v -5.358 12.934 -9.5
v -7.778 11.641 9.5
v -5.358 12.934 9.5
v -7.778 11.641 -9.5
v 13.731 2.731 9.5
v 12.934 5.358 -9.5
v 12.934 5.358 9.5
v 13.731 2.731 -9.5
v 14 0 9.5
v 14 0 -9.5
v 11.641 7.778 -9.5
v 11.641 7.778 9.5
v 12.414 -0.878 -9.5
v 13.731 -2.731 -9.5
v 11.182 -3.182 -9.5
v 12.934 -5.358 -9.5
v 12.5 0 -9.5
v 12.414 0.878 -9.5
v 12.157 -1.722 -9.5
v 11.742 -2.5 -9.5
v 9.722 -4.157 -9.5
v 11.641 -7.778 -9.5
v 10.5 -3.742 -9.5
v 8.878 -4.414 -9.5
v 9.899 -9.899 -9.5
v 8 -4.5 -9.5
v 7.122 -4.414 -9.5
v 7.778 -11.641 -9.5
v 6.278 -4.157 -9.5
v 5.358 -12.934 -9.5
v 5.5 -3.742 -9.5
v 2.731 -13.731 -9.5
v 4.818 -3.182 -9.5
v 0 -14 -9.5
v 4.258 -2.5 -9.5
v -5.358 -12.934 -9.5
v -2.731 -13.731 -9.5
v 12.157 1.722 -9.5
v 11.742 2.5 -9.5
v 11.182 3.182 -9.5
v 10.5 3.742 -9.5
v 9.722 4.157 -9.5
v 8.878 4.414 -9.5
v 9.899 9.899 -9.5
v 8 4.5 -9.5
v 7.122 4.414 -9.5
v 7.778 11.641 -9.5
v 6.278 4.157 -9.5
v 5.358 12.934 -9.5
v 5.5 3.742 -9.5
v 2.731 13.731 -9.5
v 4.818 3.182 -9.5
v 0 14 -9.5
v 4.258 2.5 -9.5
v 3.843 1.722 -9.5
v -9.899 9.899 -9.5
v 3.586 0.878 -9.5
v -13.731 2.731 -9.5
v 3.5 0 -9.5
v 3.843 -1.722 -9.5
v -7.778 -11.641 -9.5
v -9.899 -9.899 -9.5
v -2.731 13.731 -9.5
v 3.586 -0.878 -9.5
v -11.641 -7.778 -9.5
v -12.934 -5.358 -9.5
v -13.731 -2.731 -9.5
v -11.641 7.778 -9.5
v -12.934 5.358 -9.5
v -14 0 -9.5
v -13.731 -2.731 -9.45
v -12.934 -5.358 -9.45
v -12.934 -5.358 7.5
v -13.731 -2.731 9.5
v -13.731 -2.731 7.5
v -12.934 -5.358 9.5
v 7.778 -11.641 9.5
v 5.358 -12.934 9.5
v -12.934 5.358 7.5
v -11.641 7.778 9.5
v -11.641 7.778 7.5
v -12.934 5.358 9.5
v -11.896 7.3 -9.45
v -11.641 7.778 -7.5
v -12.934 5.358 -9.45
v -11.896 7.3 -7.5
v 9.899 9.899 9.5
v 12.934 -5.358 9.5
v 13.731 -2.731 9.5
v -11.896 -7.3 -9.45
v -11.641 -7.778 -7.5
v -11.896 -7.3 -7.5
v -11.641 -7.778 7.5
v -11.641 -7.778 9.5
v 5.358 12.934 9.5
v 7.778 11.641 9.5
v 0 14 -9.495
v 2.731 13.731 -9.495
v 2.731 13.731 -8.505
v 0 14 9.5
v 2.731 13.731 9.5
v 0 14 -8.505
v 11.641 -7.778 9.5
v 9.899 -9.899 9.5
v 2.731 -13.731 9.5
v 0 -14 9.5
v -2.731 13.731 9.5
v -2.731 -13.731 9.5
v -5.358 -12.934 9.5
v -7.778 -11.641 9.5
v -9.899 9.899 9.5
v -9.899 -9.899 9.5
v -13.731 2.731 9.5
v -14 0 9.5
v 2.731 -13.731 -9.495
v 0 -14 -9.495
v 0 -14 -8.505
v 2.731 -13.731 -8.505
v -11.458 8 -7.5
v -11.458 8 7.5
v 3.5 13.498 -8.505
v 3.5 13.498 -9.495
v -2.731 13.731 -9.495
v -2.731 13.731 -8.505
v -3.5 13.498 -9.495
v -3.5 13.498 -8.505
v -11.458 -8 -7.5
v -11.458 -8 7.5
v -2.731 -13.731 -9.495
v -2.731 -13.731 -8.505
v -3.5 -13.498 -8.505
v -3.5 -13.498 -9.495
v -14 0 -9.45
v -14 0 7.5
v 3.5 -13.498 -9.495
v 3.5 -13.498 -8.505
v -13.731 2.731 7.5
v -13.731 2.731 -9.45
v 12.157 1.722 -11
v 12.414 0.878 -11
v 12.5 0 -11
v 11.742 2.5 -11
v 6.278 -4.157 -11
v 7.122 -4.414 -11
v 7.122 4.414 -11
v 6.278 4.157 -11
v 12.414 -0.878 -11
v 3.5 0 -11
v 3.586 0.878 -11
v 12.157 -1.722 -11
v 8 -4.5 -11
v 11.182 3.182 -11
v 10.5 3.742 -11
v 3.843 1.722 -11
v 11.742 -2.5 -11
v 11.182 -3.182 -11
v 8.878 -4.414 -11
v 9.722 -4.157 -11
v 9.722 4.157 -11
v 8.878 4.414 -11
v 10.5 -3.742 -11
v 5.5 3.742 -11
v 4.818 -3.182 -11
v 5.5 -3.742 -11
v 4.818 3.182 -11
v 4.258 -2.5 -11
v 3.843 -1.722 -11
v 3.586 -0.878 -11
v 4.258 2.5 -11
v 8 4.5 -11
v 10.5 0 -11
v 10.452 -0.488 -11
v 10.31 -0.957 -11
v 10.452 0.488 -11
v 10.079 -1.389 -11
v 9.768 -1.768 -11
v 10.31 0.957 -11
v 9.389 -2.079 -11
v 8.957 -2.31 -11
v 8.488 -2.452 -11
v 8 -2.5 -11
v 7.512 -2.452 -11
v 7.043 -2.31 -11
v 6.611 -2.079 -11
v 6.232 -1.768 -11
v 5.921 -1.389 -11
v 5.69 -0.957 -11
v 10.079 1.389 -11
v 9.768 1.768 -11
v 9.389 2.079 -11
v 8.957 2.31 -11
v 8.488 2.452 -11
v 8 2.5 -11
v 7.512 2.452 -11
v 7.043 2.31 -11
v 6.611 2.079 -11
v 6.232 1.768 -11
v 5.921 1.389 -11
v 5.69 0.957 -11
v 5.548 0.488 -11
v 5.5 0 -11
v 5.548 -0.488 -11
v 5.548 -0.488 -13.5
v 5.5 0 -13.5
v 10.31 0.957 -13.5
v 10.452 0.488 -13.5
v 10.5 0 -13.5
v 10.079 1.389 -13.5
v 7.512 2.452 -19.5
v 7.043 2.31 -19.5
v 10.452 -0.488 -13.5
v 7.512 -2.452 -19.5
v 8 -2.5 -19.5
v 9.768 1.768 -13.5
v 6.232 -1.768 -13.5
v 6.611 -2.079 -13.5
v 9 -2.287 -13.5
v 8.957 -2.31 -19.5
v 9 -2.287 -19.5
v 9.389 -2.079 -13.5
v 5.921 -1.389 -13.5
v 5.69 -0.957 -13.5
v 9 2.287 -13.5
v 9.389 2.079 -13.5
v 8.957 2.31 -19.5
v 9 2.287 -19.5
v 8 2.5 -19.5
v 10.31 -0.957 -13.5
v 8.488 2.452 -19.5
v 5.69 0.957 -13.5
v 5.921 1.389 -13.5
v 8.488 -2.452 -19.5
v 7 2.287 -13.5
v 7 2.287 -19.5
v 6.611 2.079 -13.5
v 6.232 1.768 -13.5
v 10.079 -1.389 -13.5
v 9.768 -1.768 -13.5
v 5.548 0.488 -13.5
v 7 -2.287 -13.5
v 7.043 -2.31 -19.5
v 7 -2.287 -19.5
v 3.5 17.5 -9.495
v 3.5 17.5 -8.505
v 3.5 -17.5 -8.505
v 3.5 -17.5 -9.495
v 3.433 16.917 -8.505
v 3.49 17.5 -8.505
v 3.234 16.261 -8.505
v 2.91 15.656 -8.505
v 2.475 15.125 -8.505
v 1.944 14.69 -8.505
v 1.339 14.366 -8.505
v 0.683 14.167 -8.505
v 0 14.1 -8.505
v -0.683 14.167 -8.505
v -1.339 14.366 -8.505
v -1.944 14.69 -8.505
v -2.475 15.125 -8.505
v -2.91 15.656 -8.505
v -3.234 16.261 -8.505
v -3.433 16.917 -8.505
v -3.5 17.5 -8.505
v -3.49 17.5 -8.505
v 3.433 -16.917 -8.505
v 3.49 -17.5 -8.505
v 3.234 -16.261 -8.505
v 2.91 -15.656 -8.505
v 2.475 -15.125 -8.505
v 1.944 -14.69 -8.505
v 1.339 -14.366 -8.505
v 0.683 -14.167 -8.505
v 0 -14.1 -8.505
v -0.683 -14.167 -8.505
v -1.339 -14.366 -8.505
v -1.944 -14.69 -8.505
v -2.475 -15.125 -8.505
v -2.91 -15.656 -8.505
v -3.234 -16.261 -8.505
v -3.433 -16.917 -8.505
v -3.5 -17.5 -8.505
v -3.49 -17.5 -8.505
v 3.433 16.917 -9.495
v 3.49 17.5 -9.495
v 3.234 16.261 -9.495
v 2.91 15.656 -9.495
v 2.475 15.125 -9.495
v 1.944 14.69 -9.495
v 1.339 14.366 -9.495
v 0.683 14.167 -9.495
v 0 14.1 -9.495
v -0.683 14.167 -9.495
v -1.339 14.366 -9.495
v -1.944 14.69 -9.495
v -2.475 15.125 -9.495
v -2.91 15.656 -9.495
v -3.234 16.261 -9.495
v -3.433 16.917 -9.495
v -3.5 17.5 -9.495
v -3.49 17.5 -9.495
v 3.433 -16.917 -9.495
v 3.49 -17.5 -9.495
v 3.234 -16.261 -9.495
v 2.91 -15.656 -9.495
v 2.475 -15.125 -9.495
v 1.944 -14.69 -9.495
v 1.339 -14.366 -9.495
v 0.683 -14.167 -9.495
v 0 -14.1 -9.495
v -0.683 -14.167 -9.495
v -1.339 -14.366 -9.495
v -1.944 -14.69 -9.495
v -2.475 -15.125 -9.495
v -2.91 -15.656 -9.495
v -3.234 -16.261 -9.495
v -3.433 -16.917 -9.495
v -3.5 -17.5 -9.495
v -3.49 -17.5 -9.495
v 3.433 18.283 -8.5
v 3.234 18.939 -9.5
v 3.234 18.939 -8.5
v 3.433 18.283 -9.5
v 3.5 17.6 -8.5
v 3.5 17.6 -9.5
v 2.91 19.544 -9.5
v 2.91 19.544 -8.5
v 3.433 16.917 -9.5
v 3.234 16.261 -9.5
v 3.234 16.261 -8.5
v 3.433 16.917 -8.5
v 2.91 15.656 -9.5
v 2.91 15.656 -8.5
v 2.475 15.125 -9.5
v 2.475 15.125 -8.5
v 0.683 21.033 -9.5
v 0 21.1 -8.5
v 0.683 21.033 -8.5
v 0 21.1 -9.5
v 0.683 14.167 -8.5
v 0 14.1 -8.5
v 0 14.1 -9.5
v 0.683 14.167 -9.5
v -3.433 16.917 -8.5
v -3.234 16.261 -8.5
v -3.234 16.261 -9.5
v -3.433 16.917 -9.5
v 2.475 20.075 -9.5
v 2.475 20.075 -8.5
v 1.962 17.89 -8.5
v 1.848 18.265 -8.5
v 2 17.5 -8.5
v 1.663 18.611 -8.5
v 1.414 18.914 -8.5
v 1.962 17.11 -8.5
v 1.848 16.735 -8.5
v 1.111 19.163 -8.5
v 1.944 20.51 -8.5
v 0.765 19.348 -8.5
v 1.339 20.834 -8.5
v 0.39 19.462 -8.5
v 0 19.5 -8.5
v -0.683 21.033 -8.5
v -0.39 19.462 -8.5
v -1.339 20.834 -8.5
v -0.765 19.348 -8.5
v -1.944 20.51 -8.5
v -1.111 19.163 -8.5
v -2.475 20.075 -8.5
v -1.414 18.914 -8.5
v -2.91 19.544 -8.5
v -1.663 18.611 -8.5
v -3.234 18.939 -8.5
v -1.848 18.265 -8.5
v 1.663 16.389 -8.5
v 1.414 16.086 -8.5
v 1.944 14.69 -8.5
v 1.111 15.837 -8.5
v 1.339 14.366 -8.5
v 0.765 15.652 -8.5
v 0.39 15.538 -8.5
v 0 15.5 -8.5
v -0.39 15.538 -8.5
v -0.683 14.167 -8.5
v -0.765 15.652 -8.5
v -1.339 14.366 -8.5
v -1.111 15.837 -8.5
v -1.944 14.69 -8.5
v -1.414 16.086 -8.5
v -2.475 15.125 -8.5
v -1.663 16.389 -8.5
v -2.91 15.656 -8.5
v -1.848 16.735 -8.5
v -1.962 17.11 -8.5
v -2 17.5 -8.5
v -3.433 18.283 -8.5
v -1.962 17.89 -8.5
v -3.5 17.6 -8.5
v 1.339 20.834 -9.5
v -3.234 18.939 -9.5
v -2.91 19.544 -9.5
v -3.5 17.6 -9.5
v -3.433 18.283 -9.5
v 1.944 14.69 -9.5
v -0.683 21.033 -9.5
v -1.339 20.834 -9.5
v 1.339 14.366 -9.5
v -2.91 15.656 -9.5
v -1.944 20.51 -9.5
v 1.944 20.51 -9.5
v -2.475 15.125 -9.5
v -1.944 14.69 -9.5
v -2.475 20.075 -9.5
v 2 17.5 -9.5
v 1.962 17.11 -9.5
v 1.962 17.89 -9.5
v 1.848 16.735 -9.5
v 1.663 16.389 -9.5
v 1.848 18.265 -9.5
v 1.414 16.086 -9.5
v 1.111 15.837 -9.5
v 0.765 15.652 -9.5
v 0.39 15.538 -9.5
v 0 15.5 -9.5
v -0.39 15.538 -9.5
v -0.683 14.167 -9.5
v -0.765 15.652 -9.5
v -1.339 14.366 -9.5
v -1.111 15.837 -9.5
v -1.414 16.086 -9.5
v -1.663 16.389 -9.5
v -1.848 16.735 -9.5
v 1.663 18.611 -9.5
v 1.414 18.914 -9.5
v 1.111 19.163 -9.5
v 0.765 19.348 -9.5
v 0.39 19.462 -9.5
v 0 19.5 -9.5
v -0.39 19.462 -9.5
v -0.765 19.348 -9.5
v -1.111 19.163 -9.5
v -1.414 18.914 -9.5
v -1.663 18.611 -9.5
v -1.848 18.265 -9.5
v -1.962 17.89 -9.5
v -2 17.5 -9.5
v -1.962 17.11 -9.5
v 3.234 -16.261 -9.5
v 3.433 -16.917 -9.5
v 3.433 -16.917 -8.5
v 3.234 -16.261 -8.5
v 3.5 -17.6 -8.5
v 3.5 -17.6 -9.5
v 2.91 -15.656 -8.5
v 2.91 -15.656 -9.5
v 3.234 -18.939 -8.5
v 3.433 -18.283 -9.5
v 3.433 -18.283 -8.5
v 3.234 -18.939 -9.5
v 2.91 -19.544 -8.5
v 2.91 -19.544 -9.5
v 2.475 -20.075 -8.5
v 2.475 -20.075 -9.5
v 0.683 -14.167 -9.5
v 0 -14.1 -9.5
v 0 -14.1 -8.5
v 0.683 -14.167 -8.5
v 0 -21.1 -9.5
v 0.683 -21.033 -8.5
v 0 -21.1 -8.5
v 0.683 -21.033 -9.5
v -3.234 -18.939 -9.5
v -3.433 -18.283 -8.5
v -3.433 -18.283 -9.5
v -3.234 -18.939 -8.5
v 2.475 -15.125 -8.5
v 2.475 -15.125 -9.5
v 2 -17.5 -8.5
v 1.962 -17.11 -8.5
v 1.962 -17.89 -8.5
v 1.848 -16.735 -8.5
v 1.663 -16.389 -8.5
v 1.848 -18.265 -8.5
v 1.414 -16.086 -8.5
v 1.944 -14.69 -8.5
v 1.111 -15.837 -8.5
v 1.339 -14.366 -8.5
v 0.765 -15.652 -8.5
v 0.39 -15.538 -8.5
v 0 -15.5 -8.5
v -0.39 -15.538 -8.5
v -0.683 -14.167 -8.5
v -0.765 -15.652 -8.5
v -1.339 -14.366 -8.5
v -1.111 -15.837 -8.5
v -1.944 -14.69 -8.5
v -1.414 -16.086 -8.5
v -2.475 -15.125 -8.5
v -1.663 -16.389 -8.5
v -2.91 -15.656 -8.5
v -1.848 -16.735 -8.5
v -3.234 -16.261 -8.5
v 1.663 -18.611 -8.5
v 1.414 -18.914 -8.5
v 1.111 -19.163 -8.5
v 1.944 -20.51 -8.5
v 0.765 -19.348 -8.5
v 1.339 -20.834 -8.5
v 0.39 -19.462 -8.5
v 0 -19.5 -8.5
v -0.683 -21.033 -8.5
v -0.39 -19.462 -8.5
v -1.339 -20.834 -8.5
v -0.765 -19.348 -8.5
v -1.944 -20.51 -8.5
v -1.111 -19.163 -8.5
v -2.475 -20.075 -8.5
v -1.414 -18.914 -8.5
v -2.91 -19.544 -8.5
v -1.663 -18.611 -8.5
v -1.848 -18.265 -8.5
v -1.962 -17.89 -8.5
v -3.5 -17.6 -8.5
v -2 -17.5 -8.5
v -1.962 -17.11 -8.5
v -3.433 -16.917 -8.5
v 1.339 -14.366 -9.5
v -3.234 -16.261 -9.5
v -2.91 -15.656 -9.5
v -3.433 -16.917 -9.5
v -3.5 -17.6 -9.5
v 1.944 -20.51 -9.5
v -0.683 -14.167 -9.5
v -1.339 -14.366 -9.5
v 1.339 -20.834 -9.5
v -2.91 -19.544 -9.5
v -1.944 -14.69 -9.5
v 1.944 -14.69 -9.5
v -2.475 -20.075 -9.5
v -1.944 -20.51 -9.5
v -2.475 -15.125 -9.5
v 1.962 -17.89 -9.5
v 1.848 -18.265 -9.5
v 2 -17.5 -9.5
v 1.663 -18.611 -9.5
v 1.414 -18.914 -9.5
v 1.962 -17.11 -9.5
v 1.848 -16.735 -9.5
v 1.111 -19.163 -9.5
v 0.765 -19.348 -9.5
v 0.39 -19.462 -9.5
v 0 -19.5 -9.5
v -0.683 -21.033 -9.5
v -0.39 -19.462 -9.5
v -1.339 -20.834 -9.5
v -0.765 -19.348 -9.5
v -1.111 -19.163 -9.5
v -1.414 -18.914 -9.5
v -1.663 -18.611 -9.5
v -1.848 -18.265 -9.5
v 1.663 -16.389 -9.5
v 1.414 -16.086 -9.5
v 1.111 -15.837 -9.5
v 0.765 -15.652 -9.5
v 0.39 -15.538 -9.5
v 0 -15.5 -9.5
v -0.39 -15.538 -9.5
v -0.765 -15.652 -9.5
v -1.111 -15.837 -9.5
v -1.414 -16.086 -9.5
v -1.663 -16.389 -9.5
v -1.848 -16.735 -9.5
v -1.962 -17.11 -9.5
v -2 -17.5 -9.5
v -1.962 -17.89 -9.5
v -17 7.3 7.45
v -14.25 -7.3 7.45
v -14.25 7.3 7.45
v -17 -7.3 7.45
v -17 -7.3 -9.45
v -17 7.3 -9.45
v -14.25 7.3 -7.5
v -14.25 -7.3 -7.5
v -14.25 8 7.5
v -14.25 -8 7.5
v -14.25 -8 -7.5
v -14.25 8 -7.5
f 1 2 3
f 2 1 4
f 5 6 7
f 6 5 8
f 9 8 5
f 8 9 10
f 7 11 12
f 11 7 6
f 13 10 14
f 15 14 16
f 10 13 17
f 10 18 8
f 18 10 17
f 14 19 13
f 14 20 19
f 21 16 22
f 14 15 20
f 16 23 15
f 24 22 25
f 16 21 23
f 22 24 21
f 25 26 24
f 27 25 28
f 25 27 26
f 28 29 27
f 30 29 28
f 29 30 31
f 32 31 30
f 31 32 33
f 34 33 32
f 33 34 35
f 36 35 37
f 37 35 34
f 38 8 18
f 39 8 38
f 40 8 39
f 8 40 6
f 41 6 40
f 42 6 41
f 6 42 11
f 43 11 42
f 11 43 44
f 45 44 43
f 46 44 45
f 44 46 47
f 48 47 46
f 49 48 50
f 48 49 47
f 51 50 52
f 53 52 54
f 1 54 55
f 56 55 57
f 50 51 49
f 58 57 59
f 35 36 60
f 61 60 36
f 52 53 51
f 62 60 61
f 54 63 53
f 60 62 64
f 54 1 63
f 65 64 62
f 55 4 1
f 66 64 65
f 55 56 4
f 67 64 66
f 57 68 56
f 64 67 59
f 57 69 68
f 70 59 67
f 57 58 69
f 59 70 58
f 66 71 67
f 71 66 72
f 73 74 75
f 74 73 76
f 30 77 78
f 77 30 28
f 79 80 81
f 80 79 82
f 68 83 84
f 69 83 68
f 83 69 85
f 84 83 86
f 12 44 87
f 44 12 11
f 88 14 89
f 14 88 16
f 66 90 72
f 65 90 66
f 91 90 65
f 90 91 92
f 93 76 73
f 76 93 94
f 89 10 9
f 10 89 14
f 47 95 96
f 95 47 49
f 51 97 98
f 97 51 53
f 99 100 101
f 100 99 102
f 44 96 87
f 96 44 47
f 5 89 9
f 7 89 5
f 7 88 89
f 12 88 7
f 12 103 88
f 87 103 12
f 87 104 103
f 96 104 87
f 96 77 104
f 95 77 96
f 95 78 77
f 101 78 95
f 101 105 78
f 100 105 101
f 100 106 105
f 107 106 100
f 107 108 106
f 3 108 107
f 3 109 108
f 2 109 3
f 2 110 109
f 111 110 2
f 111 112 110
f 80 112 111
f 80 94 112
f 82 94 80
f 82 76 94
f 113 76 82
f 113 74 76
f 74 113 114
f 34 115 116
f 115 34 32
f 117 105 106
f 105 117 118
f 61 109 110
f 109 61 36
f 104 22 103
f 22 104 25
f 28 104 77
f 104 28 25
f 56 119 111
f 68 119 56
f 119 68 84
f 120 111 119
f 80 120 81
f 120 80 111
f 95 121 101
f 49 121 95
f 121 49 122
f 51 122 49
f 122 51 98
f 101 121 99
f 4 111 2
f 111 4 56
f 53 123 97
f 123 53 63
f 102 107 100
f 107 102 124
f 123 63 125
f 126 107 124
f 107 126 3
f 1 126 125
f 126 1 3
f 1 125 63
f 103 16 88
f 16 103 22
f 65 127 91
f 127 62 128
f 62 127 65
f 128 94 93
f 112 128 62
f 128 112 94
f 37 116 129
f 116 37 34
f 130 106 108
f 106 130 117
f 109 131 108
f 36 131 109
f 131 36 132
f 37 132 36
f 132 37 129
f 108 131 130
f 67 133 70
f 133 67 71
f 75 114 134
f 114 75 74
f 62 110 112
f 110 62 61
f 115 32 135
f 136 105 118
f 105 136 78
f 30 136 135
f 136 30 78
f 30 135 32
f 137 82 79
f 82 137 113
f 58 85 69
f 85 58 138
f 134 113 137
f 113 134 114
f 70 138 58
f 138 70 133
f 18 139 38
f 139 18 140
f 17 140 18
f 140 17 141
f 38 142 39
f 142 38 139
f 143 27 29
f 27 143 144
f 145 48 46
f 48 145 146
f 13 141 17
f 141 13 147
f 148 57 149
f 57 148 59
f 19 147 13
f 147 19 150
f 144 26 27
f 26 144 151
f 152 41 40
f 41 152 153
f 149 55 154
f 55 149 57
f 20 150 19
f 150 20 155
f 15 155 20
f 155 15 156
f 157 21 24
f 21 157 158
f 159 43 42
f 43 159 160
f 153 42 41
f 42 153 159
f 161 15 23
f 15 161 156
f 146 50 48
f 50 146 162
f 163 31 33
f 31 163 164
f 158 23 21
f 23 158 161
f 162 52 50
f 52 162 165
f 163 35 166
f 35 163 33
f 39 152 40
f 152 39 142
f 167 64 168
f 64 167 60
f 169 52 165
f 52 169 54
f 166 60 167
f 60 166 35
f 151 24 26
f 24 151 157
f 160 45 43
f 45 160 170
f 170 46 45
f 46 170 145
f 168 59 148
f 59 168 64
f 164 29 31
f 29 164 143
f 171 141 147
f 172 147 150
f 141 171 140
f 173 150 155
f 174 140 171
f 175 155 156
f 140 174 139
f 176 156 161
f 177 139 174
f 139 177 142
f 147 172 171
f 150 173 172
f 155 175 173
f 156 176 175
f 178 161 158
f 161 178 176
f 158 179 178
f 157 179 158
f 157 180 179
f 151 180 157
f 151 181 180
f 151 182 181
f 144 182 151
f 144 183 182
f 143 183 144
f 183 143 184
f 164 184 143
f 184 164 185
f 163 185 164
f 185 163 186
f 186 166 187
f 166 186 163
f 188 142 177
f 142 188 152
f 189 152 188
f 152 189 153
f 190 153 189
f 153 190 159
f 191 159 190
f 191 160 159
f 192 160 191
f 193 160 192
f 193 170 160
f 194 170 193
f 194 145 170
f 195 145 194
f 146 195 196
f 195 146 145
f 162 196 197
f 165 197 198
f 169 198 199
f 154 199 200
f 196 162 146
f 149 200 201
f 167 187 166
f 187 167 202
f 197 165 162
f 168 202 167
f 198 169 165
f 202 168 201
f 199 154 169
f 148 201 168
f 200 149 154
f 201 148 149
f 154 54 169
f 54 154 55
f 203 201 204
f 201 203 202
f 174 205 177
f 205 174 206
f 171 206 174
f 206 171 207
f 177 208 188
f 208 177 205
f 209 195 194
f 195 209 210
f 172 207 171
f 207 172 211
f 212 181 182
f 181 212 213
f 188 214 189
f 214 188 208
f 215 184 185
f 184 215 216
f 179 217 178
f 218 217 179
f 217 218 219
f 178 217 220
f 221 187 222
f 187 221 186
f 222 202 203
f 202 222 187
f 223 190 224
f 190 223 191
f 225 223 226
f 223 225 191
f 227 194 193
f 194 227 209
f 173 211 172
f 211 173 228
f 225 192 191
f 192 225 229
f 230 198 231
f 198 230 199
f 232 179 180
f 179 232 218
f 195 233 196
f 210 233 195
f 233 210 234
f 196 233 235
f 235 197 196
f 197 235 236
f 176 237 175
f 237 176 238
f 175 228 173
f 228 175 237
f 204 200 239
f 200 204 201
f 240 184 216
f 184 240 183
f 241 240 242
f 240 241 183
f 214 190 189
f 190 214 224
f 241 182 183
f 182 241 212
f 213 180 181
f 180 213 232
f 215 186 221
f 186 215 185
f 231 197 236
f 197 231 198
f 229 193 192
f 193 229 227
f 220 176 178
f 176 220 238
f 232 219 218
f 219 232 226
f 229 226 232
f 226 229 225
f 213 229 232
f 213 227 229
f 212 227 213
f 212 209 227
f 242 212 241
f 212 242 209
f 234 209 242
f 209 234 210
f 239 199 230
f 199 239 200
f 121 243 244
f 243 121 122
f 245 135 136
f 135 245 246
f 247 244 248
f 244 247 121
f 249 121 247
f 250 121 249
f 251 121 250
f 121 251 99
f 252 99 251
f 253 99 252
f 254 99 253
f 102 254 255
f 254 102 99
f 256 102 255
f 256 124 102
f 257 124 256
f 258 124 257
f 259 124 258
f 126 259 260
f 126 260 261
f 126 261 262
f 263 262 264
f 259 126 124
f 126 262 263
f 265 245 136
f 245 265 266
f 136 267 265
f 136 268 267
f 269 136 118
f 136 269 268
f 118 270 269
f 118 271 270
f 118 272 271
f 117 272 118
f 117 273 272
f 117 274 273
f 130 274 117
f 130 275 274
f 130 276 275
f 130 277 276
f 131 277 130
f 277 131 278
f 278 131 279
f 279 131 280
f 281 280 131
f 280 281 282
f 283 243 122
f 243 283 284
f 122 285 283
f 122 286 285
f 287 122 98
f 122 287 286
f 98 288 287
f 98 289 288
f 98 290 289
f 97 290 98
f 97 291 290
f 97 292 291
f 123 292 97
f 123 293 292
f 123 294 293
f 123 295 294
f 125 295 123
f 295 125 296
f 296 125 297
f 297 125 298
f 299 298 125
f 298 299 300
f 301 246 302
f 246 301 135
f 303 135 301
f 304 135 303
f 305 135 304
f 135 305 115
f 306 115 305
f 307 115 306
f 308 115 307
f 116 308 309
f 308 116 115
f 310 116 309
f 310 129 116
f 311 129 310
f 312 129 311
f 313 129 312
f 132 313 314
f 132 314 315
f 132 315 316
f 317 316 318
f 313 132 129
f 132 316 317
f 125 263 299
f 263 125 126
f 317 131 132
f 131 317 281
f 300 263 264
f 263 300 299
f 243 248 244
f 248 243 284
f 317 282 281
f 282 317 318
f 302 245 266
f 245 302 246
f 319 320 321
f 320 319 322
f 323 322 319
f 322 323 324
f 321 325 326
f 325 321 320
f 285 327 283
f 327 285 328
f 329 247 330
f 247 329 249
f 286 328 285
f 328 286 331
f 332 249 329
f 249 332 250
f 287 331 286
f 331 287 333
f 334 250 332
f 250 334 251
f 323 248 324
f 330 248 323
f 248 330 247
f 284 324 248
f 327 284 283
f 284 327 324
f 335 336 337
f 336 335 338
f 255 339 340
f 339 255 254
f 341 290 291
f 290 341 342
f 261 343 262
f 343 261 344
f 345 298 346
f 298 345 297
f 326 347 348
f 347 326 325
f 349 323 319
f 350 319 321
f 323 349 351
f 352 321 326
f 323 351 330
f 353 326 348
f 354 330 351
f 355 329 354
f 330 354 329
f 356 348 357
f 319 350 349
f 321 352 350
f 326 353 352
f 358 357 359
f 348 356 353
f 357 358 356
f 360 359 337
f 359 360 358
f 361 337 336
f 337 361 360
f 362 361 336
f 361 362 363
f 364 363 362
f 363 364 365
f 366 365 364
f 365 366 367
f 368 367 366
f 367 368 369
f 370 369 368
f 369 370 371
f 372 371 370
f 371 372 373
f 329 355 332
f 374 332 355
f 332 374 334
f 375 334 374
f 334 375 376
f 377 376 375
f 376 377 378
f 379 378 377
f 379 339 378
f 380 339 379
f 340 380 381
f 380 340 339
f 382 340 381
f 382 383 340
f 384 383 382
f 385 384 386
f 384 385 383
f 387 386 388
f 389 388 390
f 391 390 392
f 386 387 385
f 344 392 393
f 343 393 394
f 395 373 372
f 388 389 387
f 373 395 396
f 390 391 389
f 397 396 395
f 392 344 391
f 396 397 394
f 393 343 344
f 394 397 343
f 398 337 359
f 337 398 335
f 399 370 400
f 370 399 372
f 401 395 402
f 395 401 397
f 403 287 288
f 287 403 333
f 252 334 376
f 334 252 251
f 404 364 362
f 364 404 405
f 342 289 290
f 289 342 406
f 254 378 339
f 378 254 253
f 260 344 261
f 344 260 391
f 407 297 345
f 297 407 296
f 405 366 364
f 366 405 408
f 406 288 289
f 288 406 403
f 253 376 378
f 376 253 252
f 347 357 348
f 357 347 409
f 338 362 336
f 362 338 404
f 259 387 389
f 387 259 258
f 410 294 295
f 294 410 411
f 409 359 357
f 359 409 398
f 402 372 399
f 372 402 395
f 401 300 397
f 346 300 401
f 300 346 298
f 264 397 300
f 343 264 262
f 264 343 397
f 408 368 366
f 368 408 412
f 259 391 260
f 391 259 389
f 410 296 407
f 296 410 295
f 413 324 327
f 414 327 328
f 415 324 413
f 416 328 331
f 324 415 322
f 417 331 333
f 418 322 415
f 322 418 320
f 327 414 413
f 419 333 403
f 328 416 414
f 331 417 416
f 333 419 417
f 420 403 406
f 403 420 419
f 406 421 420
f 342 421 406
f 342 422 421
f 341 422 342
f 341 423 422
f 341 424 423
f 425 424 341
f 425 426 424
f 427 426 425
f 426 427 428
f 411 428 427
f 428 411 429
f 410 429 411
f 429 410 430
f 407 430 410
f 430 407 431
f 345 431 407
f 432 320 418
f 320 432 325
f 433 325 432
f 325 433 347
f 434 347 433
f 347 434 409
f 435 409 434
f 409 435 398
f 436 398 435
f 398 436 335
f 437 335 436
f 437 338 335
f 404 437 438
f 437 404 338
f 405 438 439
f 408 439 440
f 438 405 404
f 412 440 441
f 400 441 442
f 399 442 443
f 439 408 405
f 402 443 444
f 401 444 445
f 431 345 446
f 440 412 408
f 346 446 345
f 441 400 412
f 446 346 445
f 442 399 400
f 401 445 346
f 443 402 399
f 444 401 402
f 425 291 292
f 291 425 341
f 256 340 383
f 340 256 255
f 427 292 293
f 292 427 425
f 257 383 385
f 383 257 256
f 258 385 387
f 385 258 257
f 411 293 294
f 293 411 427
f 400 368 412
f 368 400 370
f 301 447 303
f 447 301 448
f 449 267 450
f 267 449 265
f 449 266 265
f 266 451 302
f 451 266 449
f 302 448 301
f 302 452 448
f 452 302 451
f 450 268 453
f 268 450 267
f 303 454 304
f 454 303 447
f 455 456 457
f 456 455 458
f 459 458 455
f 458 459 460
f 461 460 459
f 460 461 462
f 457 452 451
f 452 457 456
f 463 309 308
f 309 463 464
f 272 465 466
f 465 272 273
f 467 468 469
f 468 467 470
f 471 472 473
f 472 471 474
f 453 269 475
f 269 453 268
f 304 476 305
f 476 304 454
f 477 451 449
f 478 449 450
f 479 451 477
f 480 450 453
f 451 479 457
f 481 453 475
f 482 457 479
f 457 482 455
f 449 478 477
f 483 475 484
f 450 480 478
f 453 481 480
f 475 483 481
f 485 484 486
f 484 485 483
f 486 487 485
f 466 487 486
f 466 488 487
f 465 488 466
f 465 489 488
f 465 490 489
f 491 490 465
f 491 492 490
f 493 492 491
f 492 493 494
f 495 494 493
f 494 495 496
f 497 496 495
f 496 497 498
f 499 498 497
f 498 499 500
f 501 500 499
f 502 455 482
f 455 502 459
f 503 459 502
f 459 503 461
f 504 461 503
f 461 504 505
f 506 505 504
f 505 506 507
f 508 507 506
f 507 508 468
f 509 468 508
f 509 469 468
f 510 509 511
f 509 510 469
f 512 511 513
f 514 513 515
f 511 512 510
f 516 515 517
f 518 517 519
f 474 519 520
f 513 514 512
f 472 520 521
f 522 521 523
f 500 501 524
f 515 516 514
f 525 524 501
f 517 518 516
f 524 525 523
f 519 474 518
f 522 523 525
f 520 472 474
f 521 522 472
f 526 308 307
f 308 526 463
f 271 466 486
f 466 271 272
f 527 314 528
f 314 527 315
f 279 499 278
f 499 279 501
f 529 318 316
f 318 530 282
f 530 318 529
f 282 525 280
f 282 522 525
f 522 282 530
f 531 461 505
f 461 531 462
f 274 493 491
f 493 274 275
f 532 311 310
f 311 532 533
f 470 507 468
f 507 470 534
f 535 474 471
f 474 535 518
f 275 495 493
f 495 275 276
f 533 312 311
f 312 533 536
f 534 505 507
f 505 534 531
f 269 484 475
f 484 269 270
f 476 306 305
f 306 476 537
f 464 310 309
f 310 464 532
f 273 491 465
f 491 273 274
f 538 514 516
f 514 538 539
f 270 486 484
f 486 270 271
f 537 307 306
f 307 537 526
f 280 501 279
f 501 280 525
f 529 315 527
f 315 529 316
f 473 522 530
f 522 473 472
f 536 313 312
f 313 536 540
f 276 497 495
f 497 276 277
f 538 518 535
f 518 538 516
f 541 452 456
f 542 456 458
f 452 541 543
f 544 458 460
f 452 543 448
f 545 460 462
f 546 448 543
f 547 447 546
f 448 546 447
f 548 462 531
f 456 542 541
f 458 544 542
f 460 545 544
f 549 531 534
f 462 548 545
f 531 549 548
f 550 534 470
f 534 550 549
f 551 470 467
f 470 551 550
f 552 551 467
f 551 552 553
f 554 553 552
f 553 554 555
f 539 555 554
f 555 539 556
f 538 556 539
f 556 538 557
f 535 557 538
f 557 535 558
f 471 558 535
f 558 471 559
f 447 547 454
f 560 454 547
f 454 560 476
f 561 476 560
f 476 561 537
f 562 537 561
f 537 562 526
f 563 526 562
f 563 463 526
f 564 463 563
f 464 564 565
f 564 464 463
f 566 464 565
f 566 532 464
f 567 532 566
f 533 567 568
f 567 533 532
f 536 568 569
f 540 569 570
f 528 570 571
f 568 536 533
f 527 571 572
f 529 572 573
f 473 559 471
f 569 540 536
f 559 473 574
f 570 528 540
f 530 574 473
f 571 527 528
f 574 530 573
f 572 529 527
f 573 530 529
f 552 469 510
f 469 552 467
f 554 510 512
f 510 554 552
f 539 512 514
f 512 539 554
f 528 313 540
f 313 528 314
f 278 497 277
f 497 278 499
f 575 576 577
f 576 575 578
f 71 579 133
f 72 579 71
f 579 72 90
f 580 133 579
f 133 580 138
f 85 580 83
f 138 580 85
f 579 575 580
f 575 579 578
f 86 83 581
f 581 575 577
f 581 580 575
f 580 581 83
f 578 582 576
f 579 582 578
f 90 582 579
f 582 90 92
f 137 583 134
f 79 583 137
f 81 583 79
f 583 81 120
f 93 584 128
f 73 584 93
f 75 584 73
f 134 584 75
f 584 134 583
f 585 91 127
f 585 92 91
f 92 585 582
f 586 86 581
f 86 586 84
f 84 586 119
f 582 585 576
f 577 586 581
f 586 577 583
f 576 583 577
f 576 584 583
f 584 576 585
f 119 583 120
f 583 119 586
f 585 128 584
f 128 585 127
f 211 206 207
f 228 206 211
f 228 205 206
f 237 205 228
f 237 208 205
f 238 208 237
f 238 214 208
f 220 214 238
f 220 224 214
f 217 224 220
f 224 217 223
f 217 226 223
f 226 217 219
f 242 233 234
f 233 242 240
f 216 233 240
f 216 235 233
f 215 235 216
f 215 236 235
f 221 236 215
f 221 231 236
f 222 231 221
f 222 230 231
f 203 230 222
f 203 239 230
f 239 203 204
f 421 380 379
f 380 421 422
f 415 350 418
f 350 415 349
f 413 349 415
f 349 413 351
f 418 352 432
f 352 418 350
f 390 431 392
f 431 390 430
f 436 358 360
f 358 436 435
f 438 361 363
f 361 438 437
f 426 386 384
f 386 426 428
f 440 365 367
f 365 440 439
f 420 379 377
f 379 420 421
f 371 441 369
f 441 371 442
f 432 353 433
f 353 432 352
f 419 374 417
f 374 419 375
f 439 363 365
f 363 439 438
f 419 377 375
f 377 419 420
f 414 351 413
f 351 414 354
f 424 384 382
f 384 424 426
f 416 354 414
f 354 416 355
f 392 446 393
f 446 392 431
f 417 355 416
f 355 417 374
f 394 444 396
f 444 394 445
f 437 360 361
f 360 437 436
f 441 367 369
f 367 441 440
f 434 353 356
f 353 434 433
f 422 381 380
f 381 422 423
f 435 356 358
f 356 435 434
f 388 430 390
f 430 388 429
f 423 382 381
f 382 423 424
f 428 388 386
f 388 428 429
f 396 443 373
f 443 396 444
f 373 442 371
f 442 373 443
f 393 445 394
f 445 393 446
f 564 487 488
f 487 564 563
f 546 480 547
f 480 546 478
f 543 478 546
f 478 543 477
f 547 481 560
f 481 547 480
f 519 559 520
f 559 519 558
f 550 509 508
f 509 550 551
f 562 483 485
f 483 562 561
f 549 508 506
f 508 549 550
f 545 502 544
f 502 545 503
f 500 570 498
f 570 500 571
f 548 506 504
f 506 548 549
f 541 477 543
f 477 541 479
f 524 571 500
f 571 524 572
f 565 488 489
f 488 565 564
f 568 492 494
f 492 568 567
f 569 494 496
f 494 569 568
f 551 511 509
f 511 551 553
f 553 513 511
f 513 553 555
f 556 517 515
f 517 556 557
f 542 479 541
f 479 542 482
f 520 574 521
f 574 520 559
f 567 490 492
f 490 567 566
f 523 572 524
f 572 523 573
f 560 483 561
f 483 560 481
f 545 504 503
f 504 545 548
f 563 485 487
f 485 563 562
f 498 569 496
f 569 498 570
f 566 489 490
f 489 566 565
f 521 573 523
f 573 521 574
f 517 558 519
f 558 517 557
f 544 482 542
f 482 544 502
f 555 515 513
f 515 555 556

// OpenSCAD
module StepMotor28BYJ()
{

	difference(){
	
		union(){
				color("gray") cylinder(h = 19, r = 14, center = true, $fn = 32);
				color("gray") translate([8,0,-1.5])	cylinder(h = 19, r = 4.5, center = true, $fn = 32);
				color("gold") translate([8,0,-10])	cylinder(h = 19, r = 2.5, center = true, $fn = 32);


				color("Silver") translate([0,0,-9]) cube([7,35,0.99], center = true);				
				color("Silver") translate([0,17.6,-9])	cylinder(h = 1, r = 3.5, center = true, $fn = 32);

				color("Silver") translate([0,-17.6,-9])	cylinder(h = 1, r = 3.5, center = true, $fn = 32);


				color("blue") translate([-3,0,-1]) cube([28,14.6,16.9], center = true);
				color("blue") translate([-2,0,0])  cube([24.5,16,15], center = true);
			}

				// handle
				color("red") translate([11,0,-16.55]) cube([4,5,6.1], center = true);
				color("red") translate([5,0,-16.55]) cube([4,5,6.1], center = true);

				// screw holes
				color("red") translate([0,17.5,-9])	cylinder(h = 2, r = 2, center = true, $fn = 32);
				color("red") translate([0,-17.5,-9])	cylinder(h = 2, r = 2, center = true, $fn = 32);
		}
	}


StepMotor28BYJ();
